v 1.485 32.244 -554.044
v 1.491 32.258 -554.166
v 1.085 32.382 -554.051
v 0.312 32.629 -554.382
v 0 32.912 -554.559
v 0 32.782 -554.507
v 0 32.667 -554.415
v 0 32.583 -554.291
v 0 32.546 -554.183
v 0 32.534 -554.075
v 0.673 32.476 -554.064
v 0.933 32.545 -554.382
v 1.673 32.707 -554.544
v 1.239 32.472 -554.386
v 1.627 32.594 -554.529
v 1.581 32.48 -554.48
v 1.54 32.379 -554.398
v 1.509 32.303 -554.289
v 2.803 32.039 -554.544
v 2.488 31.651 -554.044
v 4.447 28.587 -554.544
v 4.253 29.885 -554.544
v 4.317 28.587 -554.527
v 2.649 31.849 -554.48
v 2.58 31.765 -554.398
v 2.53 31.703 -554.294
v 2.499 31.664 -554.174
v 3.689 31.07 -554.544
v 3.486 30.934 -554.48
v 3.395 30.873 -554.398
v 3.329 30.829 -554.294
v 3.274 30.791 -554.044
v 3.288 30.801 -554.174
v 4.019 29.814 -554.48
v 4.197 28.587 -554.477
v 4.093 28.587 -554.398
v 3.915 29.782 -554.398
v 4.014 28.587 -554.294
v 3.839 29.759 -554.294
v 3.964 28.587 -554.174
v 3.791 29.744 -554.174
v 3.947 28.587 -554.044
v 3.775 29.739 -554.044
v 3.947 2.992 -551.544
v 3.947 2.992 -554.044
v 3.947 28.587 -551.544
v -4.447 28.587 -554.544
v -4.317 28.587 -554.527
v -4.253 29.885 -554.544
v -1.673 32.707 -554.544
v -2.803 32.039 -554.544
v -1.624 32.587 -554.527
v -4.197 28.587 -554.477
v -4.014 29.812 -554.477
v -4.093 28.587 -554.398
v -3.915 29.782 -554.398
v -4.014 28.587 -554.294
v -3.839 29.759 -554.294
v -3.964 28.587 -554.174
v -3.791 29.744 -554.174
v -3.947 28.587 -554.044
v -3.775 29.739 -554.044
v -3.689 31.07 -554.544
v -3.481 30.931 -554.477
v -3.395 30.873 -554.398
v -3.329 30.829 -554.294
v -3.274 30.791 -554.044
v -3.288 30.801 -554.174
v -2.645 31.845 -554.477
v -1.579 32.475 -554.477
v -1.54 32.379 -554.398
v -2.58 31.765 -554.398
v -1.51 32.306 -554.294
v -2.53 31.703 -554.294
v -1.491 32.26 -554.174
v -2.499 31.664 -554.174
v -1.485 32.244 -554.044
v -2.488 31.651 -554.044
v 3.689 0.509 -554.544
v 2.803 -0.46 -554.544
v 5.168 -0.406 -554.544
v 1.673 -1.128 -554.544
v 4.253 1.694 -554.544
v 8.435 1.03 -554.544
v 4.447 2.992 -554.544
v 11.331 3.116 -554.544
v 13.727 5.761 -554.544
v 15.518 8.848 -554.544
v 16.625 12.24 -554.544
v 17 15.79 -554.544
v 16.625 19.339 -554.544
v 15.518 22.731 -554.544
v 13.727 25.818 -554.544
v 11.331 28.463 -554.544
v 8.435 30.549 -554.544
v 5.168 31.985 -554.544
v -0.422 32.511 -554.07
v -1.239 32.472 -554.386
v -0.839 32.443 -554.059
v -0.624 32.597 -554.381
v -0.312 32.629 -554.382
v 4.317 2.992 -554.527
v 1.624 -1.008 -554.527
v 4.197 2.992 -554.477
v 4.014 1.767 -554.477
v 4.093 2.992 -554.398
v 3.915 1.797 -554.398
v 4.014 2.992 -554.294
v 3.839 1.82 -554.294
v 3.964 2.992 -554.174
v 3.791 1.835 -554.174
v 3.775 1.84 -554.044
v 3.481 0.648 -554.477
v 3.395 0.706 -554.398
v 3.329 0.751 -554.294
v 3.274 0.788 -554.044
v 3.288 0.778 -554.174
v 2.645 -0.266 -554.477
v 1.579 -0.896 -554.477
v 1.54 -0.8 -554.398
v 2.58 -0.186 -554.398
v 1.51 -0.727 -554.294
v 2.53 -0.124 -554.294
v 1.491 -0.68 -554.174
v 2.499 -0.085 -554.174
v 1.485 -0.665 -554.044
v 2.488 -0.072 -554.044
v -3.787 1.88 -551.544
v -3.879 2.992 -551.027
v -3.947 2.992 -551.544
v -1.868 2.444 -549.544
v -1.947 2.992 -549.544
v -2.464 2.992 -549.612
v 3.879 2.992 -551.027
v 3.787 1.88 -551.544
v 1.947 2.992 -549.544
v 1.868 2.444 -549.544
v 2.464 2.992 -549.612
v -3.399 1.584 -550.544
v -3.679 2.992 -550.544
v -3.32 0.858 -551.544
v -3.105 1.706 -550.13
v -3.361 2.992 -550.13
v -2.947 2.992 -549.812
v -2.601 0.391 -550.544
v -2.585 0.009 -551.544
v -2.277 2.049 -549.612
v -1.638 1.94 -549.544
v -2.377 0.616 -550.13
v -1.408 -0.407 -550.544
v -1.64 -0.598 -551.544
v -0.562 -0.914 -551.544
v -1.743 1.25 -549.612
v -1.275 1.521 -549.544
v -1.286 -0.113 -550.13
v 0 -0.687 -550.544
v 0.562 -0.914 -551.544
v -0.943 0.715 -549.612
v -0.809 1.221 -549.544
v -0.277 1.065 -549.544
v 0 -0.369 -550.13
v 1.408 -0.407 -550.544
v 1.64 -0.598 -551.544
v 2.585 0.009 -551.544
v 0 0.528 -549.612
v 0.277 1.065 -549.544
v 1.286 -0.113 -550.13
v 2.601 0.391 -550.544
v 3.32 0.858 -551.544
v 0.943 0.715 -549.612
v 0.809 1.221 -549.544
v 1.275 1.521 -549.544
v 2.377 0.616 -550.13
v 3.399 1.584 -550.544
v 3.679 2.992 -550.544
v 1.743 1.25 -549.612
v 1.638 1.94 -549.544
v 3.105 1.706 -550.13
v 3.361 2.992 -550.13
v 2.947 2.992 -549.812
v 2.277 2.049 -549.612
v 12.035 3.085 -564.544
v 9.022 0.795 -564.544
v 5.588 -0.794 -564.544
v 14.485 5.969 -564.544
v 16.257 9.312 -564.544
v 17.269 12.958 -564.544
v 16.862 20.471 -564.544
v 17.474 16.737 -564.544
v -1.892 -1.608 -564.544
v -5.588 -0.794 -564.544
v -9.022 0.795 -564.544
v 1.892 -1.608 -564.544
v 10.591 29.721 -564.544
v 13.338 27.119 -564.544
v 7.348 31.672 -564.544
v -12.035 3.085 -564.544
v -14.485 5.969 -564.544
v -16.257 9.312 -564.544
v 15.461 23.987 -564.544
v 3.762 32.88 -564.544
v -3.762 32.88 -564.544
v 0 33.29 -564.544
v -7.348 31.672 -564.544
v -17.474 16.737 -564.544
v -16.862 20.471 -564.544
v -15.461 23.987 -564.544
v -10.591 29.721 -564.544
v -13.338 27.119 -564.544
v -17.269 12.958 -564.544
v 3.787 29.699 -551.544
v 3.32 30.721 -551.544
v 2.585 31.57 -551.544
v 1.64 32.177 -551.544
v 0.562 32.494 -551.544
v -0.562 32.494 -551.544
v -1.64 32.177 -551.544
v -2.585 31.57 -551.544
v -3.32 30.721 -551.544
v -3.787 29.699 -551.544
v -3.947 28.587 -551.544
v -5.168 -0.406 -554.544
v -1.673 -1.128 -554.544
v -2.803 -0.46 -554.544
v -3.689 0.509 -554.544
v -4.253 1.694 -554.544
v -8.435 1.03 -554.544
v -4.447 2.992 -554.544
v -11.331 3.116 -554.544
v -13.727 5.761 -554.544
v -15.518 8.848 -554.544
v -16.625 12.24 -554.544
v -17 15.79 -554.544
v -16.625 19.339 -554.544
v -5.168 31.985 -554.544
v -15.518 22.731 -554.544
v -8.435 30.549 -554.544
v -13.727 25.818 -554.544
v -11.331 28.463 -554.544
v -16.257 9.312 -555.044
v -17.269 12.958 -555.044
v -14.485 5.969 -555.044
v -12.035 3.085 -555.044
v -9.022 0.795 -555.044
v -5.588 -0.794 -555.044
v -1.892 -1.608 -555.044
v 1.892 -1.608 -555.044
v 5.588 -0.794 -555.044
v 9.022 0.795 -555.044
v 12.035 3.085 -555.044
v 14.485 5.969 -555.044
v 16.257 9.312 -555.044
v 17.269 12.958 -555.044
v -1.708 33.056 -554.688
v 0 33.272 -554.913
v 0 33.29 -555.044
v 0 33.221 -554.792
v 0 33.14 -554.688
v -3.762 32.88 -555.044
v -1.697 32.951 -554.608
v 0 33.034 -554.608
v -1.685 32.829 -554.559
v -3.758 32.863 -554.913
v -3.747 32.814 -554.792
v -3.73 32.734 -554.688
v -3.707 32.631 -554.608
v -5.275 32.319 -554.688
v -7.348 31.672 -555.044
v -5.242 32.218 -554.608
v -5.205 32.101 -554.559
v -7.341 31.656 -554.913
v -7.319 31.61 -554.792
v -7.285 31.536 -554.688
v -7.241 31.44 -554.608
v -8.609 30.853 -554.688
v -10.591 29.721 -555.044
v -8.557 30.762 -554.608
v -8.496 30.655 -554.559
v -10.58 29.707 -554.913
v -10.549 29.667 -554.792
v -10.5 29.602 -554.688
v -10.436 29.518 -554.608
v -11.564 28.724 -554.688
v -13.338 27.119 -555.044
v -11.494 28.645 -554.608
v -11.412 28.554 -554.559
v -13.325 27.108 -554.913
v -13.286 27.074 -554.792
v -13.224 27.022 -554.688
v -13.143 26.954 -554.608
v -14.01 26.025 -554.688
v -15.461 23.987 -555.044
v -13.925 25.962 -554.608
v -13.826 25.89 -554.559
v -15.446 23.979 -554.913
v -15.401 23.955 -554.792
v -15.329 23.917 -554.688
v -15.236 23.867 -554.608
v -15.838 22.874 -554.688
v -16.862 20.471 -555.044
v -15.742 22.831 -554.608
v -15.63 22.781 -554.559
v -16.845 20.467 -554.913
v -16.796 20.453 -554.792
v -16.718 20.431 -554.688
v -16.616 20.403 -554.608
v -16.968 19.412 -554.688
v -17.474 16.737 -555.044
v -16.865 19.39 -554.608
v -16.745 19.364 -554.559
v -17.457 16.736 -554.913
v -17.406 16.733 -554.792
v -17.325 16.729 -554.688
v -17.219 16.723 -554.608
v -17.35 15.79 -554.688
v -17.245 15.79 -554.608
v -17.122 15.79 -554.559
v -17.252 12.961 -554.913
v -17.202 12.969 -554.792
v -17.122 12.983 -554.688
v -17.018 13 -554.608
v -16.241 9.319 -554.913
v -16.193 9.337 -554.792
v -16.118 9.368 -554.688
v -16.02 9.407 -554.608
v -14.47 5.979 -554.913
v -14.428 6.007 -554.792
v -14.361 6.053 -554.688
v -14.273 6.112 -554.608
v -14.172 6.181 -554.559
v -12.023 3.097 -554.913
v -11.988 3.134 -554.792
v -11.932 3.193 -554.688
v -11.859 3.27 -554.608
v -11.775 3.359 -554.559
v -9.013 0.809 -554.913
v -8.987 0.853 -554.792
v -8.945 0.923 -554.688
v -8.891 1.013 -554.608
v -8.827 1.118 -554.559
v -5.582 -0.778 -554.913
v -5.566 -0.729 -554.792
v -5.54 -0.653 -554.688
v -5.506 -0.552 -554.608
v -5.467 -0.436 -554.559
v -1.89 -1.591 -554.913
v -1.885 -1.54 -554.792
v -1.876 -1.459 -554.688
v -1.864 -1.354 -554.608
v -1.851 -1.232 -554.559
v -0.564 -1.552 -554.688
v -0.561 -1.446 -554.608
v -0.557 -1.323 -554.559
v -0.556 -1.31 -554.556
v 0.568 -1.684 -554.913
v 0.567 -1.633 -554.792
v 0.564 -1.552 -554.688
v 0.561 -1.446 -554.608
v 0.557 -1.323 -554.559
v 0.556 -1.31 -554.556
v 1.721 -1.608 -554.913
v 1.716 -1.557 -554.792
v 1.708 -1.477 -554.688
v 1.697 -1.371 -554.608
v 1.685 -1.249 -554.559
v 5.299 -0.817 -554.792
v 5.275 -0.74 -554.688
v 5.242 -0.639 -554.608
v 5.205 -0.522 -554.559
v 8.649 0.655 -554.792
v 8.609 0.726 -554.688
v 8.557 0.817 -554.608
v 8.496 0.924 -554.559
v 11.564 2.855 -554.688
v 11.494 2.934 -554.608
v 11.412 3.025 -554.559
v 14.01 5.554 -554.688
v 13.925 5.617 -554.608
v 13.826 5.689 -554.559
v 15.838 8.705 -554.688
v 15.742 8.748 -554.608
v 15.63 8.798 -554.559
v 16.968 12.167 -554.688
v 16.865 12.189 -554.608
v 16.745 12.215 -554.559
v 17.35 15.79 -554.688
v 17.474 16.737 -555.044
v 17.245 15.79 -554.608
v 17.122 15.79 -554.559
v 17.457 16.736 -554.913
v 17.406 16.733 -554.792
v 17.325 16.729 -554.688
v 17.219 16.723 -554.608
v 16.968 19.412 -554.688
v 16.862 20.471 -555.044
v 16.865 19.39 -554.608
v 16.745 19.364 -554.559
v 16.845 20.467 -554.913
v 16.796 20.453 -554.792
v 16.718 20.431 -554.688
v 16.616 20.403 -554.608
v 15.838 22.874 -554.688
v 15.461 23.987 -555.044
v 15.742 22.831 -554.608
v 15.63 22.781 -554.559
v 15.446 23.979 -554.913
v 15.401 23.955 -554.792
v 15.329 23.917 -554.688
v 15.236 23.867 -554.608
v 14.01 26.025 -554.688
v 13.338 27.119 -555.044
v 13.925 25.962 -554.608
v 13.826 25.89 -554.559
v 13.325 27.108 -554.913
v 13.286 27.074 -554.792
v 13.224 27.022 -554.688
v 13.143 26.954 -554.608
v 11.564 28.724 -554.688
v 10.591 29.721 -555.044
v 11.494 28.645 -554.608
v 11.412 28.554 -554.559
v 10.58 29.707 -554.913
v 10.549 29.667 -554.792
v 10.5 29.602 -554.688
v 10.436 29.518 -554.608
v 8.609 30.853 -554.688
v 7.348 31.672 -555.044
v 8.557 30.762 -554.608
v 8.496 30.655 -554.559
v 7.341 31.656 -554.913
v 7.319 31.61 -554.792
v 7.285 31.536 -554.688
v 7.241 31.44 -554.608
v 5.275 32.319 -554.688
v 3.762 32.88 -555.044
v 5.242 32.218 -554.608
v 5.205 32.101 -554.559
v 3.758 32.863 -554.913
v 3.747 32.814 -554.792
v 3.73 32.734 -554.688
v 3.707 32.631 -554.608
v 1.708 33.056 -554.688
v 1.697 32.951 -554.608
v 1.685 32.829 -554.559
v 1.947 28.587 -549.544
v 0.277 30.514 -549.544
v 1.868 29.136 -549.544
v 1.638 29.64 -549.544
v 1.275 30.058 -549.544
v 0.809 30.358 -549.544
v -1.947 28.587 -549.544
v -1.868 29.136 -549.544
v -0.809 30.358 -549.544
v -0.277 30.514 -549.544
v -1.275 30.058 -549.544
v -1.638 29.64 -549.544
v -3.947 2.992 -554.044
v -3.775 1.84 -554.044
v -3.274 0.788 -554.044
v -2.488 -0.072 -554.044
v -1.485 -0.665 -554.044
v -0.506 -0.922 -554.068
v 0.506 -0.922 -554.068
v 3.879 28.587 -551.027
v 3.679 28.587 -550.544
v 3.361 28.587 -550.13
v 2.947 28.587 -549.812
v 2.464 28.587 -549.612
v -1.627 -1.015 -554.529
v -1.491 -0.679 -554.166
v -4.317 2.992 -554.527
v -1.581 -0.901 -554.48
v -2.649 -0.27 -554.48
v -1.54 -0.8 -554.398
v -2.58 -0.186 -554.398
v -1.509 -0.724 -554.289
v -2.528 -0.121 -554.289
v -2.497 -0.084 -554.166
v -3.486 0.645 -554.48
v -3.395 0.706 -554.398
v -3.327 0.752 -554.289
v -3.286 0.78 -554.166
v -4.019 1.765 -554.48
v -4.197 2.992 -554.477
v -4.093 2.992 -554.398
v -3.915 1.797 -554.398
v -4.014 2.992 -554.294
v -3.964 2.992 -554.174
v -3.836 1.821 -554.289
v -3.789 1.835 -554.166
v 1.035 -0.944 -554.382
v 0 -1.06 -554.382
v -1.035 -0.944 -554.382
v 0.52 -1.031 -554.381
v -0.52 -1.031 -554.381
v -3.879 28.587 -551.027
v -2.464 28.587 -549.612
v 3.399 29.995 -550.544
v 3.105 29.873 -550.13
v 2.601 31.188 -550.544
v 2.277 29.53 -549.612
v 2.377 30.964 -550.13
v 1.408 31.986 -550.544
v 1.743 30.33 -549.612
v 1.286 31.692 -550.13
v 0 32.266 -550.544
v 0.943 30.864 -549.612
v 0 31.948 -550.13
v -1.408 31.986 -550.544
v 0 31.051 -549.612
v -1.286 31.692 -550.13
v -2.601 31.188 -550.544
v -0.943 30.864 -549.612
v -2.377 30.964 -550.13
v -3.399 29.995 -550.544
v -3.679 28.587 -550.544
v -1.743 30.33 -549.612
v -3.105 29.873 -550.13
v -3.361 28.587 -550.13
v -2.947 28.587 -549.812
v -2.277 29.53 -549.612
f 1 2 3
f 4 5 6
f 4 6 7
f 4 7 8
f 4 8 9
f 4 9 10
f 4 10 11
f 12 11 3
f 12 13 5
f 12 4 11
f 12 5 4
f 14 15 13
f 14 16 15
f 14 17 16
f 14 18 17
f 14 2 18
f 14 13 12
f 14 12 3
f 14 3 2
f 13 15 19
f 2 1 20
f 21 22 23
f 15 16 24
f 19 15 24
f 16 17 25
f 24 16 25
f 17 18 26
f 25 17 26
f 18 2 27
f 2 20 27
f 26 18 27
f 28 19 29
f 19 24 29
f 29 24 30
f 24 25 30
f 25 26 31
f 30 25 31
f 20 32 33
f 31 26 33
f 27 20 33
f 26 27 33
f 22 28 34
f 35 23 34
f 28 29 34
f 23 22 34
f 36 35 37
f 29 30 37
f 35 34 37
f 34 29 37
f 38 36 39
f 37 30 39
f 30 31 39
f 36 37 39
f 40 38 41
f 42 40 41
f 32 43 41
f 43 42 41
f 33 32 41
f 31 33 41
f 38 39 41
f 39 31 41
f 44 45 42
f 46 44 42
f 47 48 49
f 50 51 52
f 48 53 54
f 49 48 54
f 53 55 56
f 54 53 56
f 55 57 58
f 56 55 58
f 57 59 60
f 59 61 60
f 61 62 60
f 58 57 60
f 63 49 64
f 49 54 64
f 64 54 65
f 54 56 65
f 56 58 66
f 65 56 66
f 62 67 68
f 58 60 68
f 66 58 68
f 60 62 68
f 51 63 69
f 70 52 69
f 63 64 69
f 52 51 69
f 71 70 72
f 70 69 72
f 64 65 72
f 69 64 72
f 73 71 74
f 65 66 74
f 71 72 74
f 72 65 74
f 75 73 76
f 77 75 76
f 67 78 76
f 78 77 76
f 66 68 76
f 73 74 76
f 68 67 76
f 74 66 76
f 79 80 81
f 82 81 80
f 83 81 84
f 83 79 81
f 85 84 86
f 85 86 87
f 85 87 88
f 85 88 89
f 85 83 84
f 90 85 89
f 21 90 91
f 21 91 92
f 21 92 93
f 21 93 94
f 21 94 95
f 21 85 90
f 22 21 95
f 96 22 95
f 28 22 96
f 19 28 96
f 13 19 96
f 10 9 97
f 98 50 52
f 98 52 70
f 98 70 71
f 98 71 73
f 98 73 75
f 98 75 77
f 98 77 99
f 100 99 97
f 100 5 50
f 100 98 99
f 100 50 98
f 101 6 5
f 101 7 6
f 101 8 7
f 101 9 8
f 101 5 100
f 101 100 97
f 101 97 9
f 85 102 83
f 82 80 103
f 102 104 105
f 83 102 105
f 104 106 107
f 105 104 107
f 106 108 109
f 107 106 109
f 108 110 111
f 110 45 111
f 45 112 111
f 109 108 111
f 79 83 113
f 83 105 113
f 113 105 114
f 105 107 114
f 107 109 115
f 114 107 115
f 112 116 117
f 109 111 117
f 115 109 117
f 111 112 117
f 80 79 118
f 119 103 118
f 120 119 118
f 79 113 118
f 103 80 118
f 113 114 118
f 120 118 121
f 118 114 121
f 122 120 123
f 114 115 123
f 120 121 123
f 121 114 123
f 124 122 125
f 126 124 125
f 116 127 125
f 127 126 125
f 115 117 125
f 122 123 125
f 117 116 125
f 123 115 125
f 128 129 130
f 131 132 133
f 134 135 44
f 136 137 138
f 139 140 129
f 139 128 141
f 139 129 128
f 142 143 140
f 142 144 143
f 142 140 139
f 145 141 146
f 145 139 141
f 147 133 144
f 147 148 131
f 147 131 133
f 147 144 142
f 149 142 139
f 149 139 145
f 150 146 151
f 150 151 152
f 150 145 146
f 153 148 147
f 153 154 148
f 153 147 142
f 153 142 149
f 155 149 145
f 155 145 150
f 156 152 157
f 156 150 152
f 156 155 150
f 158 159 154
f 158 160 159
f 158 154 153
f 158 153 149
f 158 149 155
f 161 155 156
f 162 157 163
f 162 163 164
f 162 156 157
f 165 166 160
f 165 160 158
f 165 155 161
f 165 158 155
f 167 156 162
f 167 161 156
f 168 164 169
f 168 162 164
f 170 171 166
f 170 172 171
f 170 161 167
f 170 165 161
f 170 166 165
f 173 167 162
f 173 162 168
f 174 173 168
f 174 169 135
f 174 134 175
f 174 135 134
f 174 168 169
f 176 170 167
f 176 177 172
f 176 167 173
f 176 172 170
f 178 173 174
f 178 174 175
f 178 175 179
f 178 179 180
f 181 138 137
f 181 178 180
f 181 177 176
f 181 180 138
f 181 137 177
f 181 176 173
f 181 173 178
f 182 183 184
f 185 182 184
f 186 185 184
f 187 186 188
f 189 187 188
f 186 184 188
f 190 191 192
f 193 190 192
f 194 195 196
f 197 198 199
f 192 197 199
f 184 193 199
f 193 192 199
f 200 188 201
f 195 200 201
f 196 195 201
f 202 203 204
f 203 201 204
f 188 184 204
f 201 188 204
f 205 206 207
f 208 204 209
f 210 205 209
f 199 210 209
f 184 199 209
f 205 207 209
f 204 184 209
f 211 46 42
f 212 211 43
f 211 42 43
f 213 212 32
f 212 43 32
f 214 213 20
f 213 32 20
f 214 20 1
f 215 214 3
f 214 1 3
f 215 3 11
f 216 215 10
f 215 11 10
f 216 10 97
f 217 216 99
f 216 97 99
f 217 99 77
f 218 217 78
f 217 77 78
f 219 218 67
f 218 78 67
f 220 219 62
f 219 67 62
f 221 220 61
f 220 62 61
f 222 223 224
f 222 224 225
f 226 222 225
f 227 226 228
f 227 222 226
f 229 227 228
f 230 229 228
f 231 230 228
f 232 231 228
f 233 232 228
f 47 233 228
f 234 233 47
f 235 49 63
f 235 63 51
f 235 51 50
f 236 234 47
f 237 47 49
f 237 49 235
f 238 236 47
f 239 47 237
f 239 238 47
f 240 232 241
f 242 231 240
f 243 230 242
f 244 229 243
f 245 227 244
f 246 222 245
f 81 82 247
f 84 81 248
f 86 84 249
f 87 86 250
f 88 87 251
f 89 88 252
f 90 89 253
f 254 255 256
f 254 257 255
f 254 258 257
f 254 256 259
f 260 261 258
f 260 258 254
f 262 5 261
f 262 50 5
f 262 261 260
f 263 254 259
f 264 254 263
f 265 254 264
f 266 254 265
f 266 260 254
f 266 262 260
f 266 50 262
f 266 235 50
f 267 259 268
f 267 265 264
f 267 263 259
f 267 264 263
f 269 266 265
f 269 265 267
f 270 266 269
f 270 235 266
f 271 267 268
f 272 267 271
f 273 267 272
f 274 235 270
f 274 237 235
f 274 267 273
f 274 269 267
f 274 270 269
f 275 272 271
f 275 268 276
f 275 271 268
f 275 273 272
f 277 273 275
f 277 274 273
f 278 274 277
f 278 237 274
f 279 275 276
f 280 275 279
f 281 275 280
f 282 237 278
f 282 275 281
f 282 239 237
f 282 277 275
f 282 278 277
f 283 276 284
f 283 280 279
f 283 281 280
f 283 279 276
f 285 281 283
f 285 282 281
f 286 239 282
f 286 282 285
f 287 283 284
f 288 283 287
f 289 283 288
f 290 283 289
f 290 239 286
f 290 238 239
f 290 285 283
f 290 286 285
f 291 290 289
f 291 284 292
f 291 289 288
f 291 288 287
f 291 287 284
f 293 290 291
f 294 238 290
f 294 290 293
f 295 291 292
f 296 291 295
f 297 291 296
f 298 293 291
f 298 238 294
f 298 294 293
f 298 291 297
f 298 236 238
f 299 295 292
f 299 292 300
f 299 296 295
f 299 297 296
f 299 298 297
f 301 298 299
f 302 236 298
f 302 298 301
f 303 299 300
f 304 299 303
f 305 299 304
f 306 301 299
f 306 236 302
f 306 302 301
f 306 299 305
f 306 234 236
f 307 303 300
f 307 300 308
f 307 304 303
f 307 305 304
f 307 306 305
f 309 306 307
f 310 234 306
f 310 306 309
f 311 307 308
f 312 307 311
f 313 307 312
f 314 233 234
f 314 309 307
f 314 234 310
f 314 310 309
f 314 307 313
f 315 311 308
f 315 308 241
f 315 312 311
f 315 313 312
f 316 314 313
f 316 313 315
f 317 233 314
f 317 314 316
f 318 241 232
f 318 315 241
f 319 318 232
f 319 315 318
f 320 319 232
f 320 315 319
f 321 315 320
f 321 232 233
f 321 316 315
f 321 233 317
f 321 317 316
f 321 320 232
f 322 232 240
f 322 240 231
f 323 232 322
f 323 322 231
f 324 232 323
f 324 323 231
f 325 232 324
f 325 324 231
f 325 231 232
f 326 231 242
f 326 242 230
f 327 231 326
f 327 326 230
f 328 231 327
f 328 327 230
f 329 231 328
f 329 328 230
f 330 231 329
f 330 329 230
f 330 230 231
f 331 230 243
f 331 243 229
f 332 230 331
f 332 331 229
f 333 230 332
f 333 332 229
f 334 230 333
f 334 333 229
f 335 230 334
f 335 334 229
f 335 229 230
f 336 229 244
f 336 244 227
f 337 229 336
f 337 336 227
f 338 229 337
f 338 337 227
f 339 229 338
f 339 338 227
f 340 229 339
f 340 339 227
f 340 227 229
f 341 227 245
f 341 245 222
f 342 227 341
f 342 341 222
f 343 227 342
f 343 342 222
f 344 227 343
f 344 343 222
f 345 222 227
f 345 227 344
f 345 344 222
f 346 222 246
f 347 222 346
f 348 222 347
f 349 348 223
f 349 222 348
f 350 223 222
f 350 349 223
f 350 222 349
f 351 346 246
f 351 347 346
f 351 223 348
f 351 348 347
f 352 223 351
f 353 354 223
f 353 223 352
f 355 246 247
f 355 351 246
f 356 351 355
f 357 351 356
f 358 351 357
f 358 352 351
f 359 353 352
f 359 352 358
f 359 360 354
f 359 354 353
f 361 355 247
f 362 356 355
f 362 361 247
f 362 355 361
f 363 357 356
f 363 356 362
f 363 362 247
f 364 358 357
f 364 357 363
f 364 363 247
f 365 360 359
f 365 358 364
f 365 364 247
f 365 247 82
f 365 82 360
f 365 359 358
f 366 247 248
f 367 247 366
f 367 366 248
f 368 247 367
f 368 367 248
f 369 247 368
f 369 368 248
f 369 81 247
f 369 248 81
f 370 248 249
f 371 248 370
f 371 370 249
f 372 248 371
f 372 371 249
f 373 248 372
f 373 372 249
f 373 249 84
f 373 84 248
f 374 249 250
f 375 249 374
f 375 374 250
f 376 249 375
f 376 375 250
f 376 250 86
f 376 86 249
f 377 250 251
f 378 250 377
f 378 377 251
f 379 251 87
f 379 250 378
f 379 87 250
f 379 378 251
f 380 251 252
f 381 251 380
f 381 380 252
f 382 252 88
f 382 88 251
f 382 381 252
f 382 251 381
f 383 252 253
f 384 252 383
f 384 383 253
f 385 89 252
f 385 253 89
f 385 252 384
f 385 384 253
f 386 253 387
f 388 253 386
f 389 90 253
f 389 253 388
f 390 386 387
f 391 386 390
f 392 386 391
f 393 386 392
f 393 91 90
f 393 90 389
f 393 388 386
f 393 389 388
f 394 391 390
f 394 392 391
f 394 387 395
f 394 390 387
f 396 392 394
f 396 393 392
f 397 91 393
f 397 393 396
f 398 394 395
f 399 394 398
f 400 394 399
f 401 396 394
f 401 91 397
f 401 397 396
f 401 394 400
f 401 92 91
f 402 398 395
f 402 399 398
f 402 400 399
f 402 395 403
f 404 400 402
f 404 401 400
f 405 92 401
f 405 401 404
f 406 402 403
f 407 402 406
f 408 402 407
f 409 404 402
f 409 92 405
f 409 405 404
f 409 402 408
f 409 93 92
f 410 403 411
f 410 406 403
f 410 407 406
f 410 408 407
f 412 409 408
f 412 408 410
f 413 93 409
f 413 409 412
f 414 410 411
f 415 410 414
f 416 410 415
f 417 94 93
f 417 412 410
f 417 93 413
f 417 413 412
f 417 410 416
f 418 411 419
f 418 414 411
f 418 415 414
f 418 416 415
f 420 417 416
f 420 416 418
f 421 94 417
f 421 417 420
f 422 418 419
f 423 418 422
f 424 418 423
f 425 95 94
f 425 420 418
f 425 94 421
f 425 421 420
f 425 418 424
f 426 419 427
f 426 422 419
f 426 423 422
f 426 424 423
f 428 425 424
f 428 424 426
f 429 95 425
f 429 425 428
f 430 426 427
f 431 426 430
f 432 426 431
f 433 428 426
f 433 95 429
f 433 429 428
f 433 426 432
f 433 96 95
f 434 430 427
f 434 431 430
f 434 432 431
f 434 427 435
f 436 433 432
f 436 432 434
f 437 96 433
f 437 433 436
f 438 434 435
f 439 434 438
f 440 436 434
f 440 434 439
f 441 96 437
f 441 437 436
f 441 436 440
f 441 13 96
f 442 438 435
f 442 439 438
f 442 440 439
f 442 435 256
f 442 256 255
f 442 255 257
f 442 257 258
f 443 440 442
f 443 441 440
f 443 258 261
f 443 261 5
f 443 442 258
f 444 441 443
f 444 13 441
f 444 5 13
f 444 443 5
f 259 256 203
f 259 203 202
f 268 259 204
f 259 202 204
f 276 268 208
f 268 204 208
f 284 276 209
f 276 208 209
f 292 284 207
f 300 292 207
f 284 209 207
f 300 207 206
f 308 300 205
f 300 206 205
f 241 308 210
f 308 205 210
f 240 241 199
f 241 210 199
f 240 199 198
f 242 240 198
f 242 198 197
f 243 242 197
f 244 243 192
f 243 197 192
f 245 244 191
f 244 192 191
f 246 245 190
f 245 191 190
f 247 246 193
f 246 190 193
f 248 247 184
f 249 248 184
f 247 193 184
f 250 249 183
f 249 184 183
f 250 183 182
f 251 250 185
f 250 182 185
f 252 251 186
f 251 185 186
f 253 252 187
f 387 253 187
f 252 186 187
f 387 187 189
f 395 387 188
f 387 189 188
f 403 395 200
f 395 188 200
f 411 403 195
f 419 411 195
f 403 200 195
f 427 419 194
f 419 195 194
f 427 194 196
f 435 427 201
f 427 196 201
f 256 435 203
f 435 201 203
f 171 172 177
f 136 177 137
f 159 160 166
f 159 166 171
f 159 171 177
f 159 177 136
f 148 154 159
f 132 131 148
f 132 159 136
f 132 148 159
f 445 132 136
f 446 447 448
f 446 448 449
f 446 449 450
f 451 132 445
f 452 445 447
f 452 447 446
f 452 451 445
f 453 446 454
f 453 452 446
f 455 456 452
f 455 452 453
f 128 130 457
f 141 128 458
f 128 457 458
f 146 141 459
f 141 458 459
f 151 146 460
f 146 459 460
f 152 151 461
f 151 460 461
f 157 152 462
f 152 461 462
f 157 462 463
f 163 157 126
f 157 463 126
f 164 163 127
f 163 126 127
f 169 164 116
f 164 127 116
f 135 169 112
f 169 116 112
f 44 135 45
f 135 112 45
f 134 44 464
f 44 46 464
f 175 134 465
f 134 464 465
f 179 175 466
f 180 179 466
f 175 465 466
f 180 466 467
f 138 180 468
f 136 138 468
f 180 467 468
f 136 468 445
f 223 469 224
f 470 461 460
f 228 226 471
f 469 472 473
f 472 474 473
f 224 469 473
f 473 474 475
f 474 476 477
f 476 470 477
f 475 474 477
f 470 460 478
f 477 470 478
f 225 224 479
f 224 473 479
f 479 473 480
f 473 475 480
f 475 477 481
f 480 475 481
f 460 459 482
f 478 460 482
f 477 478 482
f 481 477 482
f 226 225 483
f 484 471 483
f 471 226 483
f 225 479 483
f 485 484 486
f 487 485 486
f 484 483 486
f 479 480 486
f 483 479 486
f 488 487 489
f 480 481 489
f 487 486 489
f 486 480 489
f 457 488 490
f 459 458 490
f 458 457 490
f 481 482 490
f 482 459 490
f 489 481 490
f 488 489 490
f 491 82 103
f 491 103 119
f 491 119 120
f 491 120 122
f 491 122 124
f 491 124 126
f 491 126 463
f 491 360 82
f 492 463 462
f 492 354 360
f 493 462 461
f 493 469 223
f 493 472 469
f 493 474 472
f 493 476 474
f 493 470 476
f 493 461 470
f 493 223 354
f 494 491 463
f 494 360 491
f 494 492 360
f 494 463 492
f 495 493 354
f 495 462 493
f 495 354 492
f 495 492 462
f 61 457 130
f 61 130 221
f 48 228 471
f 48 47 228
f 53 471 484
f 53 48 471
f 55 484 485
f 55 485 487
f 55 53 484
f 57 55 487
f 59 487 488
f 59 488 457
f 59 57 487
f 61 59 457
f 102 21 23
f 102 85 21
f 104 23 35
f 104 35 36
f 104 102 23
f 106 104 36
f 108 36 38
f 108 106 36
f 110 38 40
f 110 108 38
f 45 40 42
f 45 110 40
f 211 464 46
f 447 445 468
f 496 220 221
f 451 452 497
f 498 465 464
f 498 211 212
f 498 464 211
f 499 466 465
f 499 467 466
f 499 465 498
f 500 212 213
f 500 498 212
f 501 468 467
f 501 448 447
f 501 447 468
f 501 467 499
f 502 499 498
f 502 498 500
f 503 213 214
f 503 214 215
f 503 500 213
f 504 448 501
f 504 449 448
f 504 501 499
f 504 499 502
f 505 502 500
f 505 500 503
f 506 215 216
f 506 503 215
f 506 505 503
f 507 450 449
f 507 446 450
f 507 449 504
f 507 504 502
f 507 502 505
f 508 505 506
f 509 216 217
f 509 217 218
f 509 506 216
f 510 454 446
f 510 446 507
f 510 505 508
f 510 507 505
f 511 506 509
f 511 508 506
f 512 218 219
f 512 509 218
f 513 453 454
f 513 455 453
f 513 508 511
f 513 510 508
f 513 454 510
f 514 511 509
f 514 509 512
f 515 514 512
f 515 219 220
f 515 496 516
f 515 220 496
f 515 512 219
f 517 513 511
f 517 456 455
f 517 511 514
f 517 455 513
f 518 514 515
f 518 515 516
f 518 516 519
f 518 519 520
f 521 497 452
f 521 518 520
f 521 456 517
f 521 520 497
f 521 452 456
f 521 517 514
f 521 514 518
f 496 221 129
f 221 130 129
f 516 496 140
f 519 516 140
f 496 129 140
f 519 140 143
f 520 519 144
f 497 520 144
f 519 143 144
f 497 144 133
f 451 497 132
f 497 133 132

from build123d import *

# Parameters (mm, degrees)
SKETCH048_R  = 17.5
PAD032_DEPTH = 10
PAD033_DEPTH = 5
FILLET011_R  = 0.5
FILLET012_R  = 0.5
FILLET013_R  = 2


with BuildPart() as part:
    # Sketch048 (on DatumPlane) → Pad032 (new body)
    with BuildSketch(Plane(origin=(0, 15.789559, -564.544271), x_dir=(0, 1, 0), z_dir=(0, 0, 1))):
        Circle(SKETCH048_R)
    extrude(amount=PAD032_DEPTH)

    # Sketch049 (on Face3 of Pad032) → Pad033 (join)
    with BuildSketch(Plane(origin=(0, 15.789559, -554.544271), x_dir=(0, 1, 0), z_dir=(0, 0, 1))):
        with BuildLine():
            ThreePointArc((-12.797492, 3.946719), (-16.744211, 0), (-12.797492, -3.946719))
            Line((-12.797492, -3.946719), (12.797492, -3.946719))
            ThreePointArc((12.797492, -3.946719), (16.744211, 0), (12.797492, 3.946719))
            Line((-12.797492, 3.946719), (12.797492, 3.946719))
        make_face()
    extrude(amount=PAD033_DEPTH)

    # Fillet011
    fillet011_edges = [part.edges().sort_by_distance(p)[0] for p in [
        (0, -1.710441, -554.544271),
    ]]
    fillet(fillet011_edges, radius=FILLET011_R)

    # Fillet012
    fillet012_edges = [part.edges().sort_by_distance(p)[0] for p in [
        (-3.946719, 15.789559, -554.544271),
    ]]
    fillet(fillet012_edges, radius=FILLET012_R)

    # Fillet013
    fillet013_edges = [part.edges().sort_by_distance(p)[0] for p in [
        (0, 32.53377, -549.544271),
    ]]
    fillet(fillet013_edges, radius=FILLET013_R)


solid = part.part
